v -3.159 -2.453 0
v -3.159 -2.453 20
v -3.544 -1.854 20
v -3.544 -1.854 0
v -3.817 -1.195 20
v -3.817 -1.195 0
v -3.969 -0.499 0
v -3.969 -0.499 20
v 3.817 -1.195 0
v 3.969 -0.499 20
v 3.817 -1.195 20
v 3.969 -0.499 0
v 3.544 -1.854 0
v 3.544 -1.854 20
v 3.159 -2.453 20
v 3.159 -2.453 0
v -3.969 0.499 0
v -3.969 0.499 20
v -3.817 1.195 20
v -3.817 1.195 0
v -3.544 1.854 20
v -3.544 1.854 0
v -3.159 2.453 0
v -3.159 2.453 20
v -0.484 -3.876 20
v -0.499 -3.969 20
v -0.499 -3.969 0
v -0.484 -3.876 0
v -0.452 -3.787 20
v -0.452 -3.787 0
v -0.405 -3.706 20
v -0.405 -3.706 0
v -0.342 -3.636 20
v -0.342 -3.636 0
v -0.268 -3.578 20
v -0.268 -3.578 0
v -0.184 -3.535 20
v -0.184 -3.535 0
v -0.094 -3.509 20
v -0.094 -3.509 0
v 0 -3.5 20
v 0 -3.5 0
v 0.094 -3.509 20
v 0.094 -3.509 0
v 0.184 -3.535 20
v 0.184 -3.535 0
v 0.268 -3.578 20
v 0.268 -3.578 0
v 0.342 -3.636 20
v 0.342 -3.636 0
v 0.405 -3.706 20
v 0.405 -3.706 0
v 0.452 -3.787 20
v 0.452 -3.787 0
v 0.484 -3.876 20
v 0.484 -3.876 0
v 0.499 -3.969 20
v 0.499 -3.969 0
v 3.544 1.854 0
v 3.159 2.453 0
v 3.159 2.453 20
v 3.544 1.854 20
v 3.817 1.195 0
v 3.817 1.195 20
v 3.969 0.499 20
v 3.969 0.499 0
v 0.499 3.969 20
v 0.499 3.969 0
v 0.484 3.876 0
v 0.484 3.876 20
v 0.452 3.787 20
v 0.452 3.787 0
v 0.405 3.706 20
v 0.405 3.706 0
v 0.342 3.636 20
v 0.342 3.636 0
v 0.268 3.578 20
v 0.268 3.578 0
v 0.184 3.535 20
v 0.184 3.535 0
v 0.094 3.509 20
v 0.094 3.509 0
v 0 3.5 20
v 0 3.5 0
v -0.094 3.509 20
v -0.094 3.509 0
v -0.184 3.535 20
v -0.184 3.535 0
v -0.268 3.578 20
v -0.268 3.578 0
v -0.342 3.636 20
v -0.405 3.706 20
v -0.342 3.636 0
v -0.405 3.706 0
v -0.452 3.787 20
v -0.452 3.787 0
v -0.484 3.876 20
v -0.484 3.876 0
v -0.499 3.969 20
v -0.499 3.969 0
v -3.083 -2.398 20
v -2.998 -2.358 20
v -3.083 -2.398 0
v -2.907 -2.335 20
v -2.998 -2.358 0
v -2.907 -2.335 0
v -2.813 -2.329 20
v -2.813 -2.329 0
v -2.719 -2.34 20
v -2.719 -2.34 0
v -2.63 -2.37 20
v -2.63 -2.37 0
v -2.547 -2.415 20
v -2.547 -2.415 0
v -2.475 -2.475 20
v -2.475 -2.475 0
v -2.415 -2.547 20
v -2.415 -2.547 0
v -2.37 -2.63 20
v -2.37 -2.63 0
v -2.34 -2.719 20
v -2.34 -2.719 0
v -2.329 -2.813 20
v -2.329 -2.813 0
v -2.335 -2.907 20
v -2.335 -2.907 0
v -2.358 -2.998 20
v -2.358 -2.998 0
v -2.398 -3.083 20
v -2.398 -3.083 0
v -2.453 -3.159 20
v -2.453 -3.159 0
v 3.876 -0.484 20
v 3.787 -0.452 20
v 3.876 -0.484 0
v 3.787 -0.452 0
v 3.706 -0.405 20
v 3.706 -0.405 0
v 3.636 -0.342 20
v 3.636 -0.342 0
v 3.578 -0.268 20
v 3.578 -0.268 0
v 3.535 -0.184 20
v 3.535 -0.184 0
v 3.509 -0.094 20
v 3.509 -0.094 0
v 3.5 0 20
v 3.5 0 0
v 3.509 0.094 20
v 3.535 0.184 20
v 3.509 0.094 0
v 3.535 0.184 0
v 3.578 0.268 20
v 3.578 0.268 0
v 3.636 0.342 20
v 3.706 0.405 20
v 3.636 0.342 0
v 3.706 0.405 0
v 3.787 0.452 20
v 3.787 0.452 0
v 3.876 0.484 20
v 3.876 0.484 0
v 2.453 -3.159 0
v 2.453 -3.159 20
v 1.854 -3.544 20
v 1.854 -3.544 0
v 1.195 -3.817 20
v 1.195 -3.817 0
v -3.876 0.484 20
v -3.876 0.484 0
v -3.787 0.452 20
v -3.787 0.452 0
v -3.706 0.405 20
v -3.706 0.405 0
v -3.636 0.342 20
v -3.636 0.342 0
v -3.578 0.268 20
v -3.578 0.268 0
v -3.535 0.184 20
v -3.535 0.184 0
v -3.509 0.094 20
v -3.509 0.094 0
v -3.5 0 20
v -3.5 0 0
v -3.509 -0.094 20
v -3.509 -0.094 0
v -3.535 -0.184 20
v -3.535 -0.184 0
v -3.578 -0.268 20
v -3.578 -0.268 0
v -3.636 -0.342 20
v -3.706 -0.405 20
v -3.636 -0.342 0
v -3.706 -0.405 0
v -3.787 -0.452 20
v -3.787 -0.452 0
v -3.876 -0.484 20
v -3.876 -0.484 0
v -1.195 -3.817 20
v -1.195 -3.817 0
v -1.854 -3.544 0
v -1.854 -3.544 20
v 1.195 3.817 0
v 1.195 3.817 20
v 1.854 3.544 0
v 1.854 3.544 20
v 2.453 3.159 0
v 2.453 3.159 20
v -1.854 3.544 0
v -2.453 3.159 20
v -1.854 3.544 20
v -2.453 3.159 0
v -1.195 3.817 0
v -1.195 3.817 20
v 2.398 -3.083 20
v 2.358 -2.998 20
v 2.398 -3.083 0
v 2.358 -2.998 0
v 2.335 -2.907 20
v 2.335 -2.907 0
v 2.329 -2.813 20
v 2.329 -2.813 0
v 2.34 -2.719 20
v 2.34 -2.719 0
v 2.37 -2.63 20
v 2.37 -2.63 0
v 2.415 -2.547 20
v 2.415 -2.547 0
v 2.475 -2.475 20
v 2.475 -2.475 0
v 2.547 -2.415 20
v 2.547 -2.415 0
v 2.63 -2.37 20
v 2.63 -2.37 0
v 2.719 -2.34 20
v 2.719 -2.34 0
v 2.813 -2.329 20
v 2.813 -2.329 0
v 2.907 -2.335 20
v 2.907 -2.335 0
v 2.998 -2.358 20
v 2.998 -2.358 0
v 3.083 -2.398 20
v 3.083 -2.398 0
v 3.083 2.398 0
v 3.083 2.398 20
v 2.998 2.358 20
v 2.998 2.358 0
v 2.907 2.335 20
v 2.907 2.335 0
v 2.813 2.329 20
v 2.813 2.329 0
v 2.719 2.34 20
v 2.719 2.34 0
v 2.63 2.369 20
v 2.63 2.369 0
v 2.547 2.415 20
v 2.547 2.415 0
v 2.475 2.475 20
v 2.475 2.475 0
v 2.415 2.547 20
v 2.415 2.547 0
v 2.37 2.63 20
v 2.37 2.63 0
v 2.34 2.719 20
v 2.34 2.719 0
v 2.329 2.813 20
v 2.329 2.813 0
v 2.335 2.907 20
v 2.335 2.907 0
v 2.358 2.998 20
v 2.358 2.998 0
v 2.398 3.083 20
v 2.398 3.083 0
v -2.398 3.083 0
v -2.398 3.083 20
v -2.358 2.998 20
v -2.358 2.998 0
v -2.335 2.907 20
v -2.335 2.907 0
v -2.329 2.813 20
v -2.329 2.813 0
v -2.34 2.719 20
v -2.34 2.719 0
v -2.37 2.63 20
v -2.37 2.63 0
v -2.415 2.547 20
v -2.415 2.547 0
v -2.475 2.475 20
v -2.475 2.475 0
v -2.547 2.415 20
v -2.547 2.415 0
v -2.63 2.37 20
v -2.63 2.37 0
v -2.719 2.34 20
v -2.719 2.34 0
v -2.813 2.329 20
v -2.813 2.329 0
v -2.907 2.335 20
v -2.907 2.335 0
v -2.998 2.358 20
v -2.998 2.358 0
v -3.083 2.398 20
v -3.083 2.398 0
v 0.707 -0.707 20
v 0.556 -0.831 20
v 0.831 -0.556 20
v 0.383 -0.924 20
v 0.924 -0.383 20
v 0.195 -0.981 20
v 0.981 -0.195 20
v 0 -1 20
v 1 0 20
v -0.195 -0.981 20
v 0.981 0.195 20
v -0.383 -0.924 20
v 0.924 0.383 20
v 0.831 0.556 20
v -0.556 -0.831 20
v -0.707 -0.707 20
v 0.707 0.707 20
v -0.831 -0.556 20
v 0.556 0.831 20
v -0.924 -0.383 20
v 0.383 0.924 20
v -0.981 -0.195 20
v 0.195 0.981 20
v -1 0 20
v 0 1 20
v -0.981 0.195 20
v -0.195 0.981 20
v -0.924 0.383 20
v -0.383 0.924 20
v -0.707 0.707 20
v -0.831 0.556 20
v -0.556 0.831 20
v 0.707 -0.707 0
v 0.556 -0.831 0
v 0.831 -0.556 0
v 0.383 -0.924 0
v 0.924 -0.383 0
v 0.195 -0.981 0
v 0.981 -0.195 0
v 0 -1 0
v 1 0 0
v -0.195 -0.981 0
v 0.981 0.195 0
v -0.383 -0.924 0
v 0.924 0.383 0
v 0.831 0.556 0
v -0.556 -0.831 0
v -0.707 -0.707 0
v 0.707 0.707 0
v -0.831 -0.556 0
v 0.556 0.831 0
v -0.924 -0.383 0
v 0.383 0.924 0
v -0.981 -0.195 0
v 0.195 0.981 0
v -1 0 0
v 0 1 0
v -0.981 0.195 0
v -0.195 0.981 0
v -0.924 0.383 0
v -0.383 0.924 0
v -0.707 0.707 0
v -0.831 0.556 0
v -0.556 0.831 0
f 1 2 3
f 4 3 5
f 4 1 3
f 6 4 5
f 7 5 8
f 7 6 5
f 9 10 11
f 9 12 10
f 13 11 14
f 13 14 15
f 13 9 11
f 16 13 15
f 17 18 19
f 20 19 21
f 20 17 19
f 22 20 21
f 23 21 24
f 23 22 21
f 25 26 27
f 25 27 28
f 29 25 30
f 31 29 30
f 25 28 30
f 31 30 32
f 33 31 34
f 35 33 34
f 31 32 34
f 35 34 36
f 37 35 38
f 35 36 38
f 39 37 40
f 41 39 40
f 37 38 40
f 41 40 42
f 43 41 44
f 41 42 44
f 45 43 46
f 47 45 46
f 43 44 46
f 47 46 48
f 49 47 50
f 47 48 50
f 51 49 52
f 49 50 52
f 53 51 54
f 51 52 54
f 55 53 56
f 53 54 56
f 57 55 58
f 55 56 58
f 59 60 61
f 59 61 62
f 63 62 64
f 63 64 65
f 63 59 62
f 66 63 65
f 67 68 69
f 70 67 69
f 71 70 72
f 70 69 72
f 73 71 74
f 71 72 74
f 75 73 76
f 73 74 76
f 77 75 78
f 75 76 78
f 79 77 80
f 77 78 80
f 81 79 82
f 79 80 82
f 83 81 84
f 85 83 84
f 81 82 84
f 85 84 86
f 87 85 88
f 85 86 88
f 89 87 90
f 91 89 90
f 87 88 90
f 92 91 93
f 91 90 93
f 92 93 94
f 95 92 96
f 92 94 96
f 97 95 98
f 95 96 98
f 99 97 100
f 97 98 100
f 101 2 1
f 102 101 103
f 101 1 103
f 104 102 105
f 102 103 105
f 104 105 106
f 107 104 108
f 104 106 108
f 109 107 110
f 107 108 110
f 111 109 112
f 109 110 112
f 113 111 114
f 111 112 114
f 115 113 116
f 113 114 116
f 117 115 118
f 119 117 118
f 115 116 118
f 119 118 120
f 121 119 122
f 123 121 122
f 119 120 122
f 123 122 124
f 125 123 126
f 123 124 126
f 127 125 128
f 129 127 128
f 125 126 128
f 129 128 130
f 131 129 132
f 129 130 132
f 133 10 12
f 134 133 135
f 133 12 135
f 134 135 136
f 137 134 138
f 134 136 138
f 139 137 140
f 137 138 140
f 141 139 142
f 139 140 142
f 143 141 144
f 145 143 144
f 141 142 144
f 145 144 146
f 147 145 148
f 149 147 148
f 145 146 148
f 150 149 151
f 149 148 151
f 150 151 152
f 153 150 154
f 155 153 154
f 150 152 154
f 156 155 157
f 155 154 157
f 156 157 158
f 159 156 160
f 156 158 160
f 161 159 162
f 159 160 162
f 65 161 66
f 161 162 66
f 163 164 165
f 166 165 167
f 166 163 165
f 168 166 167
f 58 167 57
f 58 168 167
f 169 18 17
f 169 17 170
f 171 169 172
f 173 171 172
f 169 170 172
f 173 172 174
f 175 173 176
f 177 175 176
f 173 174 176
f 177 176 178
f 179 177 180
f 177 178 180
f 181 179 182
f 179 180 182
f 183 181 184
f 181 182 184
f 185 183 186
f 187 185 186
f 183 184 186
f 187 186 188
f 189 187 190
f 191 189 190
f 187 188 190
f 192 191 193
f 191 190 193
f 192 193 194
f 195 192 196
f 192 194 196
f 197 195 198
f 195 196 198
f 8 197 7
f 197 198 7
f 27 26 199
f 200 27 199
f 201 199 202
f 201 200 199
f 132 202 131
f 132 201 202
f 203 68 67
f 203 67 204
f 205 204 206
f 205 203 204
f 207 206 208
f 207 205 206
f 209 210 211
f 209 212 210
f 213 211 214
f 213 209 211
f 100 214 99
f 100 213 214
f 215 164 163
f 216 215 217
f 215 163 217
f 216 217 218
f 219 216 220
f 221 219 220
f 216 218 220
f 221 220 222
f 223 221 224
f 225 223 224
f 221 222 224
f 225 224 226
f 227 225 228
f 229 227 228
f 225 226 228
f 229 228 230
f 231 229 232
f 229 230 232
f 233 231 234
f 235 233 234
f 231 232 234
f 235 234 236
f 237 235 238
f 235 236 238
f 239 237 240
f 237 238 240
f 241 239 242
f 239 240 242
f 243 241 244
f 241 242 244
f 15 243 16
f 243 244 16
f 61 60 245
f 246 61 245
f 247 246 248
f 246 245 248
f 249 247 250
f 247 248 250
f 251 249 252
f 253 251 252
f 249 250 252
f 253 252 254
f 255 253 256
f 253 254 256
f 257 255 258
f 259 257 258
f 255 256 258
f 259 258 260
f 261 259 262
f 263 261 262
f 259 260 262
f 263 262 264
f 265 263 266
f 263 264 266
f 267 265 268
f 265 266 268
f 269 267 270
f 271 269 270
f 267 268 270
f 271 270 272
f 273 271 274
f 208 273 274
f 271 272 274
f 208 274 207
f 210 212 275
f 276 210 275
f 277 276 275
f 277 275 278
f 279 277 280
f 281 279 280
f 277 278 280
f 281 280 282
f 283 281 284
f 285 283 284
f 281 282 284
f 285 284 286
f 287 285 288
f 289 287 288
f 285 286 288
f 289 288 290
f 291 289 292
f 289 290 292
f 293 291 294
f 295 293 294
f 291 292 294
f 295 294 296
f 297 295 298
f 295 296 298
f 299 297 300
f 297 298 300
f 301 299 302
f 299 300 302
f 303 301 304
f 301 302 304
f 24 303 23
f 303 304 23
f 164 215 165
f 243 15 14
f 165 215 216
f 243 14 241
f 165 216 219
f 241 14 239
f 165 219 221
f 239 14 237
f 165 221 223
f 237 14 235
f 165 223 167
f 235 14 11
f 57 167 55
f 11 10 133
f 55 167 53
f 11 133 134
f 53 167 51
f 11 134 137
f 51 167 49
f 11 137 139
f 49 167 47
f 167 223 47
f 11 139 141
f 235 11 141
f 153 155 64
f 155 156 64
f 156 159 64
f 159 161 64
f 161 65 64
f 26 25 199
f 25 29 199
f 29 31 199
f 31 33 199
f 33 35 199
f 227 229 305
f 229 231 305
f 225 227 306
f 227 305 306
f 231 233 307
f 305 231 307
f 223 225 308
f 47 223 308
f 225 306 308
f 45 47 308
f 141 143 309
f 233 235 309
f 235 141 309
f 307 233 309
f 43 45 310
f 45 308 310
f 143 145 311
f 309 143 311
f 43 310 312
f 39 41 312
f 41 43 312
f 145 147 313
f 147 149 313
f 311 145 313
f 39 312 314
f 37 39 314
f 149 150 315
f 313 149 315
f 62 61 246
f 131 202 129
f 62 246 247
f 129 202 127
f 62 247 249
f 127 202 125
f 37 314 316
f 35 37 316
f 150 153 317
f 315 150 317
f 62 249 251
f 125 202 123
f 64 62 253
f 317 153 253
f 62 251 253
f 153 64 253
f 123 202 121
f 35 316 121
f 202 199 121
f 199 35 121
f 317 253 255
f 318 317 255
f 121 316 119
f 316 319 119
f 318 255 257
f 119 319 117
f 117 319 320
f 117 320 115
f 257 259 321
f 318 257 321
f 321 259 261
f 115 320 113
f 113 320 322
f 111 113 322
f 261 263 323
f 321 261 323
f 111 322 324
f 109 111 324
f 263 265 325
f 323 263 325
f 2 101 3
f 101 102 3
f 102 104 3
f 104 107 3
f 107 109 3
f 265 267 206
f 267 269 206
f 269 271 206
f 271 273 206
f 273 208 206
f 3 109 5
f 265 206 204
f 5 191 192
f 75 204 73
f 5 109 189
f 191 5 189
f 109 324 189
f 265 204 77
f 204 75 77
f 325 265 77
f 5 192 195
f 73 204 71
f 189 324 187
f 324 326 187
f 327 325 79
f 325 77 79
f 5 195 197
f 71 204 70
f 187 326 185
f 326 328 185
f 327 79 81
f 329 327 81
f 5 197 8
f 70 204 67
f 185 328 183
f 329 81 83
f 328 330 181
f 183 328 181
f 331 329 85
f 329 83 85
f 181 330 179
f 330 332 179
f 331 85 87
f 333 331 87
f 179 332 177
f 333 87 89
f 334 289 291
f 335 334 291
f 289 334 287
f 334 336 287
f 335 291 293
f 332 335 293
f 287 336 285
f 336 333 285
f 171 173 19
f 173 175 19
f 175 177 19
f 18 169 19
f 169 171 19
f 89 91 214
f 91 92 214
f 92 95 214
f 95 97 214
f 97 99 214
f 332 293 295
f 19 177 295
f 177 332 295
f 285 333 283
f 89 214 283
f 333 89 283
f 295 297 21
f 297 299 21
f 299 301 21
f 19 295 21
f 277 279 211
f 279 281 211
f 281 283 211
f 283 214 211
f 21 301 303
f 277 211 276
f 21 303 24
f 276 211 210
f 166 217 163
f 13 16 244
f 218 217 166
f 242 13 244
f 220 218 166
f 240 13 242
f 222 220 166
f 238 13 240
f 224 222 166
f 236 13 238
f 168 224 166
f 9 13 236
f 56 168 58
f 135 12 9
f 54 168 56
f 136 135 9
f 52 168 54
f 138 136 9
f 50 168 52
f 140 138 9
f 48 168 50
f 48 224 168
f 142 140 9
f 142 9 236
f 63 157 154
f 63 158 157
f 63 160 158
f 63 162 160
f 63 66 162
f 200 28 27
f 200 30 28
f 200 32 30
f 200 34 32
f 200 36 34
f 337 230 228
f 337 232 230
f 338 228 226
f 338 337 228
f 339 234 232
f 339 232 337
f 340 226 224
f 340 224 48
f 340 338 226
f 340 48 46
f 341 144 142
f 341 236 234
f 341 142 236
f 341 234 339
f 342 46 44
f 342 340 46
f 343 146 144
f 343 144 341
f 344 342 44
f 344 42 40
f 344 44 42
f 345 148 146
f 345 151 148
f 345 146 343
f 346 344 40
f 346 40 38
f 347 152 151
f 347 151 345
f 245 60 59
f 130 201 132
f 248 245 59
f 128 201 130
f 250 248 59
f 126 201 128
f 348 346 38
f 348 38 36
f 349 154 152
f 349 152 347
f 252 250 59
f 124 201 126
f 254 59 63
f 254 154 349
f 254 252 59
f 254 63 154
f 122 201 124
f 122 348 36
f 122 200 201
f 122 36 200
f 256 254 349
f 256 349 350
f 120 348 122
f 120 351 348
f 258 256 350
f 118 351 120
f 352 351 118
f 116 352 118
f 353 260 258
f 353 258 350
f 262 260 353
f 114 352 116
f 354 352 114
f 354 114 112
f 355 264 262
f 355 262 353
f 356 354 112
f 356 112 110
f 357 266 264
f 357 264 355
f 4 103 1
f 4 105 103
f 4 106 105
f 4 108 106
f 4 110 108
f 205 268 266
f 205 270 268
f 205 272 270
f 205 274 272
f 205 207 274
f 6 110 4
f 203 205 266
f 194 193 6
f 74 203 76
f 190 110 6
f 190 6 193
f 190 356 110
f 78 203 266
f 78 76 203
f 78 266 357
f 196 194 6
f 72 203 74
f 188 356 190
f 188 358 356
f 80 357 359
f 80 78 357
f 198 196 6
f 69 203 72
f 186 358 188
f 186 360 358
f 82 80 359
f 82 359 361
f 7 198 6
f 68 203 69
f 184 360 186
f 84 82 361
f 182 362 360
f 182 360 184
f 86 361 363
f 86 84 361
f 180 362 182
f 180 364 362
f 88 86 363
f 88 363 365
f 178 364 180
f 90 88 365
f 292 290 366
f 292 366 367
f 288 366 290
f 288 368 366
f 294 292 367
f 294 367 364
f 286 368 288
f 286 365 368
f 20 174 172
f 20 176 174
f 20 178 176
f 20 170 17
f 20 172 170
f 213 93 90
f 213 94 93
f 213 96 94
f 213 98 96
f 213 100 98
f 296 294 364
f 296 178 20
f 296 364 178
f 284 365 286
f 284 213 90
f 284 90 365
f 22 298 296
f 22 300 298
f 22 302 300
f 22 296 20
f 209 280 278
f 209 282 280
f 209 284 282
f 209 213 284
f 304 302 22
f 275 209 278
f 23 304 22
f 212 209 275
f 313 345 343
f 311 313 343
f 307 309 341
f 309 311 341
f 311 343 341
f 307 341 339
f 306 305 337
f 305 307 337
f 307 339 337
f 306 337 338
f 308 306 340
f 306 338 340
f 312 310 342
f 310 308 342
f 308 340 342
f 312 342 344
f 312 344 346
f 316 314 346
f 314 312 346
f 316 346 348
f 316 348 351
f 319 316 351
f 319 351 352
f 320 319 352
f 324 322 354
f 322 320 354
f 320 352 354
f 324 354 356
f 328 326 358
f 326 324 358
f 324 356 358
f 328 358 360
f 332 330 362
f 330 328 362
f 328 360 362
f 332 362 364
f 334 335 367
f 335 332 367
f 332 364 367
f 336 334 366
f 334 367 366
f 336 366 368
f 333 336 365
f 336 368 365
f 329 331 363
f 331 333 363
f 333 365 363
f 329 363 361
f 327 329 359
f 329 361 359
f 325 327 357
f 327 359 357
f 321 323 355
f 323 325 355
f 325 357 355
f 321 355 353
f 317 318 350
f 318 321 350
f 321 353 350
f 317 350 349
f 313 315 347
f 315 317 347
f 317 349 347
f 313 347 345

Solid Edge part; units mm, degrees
sketch "Sketch1" plane through (0, 0, 0) normal (0, 0, 1) x (1, 0, 0)
  arc A0 (3.9688, -0.499) -> (3.1592, -2.4535) centre (0, 0) cw
  arc A1 (2.4535, -3.1592) -> (0.499, -3.9688) centre (0, 0) cw
  arc A2 (-0.499, -3.9688) -> (-2.4535, -3.1592) centre (0, 0) cw
  arc A3 (-3.1592, -2.4535) -> (-3.9688, -0.499) centre (0, 0) cw
  arc A4 (-3.9688, 0.499) -> (-3.1592, 2.4535) centre (0, 0) cw
  arc A5 (-2.4535, 3.1592) -> (-0.499, 3.9688) centre (0, 0) cw
  arc A6 (0.499, 3.9688) -> (2.4535, 3.1592) centre (0, 0) cw
  arc A7 (2.4535, -3.1592) -> (3.1592, -2.4535) centre (2.8284, -2.8284) cw
  arc A8 (-0.499, -3.9688) -> (0.499, -3.9688) centre (0, -4) cw
  arc A9 (-3.1592, -2.4535) -> (-2.4535, -3.1592) centre (-2.8284, -2.8284) cw
  arc A10 (-3.9688, 0.499) -> (-3.9688, -0.499) centre (-4, 0) cw
  arc A11 (-2.4535, 3.1592) -> (-3.1592, 2.4535) centre (-2.8284, 2.8284) cw
  arc A12 (0.499, 3.9688) -> (-0.499, 3.9688) centre (0, 4) cw
  arc A13 (3.1592, 2.4535) -> (2.4535, 3.1592) centre (2.8284, 2.8284) cw
  arc A14 (3.1592, 2.4535) -> (3.9688, 0.499) centre (0, 0) cw
  arc A15 (3.9688, -0.499) -> (3.9688, 0.499) centre (4, 0) cw
  circle A16 centre (0, 0) radius 1
extrude "Protrusion1" add sketch "Sketch1" along normal blind 20
